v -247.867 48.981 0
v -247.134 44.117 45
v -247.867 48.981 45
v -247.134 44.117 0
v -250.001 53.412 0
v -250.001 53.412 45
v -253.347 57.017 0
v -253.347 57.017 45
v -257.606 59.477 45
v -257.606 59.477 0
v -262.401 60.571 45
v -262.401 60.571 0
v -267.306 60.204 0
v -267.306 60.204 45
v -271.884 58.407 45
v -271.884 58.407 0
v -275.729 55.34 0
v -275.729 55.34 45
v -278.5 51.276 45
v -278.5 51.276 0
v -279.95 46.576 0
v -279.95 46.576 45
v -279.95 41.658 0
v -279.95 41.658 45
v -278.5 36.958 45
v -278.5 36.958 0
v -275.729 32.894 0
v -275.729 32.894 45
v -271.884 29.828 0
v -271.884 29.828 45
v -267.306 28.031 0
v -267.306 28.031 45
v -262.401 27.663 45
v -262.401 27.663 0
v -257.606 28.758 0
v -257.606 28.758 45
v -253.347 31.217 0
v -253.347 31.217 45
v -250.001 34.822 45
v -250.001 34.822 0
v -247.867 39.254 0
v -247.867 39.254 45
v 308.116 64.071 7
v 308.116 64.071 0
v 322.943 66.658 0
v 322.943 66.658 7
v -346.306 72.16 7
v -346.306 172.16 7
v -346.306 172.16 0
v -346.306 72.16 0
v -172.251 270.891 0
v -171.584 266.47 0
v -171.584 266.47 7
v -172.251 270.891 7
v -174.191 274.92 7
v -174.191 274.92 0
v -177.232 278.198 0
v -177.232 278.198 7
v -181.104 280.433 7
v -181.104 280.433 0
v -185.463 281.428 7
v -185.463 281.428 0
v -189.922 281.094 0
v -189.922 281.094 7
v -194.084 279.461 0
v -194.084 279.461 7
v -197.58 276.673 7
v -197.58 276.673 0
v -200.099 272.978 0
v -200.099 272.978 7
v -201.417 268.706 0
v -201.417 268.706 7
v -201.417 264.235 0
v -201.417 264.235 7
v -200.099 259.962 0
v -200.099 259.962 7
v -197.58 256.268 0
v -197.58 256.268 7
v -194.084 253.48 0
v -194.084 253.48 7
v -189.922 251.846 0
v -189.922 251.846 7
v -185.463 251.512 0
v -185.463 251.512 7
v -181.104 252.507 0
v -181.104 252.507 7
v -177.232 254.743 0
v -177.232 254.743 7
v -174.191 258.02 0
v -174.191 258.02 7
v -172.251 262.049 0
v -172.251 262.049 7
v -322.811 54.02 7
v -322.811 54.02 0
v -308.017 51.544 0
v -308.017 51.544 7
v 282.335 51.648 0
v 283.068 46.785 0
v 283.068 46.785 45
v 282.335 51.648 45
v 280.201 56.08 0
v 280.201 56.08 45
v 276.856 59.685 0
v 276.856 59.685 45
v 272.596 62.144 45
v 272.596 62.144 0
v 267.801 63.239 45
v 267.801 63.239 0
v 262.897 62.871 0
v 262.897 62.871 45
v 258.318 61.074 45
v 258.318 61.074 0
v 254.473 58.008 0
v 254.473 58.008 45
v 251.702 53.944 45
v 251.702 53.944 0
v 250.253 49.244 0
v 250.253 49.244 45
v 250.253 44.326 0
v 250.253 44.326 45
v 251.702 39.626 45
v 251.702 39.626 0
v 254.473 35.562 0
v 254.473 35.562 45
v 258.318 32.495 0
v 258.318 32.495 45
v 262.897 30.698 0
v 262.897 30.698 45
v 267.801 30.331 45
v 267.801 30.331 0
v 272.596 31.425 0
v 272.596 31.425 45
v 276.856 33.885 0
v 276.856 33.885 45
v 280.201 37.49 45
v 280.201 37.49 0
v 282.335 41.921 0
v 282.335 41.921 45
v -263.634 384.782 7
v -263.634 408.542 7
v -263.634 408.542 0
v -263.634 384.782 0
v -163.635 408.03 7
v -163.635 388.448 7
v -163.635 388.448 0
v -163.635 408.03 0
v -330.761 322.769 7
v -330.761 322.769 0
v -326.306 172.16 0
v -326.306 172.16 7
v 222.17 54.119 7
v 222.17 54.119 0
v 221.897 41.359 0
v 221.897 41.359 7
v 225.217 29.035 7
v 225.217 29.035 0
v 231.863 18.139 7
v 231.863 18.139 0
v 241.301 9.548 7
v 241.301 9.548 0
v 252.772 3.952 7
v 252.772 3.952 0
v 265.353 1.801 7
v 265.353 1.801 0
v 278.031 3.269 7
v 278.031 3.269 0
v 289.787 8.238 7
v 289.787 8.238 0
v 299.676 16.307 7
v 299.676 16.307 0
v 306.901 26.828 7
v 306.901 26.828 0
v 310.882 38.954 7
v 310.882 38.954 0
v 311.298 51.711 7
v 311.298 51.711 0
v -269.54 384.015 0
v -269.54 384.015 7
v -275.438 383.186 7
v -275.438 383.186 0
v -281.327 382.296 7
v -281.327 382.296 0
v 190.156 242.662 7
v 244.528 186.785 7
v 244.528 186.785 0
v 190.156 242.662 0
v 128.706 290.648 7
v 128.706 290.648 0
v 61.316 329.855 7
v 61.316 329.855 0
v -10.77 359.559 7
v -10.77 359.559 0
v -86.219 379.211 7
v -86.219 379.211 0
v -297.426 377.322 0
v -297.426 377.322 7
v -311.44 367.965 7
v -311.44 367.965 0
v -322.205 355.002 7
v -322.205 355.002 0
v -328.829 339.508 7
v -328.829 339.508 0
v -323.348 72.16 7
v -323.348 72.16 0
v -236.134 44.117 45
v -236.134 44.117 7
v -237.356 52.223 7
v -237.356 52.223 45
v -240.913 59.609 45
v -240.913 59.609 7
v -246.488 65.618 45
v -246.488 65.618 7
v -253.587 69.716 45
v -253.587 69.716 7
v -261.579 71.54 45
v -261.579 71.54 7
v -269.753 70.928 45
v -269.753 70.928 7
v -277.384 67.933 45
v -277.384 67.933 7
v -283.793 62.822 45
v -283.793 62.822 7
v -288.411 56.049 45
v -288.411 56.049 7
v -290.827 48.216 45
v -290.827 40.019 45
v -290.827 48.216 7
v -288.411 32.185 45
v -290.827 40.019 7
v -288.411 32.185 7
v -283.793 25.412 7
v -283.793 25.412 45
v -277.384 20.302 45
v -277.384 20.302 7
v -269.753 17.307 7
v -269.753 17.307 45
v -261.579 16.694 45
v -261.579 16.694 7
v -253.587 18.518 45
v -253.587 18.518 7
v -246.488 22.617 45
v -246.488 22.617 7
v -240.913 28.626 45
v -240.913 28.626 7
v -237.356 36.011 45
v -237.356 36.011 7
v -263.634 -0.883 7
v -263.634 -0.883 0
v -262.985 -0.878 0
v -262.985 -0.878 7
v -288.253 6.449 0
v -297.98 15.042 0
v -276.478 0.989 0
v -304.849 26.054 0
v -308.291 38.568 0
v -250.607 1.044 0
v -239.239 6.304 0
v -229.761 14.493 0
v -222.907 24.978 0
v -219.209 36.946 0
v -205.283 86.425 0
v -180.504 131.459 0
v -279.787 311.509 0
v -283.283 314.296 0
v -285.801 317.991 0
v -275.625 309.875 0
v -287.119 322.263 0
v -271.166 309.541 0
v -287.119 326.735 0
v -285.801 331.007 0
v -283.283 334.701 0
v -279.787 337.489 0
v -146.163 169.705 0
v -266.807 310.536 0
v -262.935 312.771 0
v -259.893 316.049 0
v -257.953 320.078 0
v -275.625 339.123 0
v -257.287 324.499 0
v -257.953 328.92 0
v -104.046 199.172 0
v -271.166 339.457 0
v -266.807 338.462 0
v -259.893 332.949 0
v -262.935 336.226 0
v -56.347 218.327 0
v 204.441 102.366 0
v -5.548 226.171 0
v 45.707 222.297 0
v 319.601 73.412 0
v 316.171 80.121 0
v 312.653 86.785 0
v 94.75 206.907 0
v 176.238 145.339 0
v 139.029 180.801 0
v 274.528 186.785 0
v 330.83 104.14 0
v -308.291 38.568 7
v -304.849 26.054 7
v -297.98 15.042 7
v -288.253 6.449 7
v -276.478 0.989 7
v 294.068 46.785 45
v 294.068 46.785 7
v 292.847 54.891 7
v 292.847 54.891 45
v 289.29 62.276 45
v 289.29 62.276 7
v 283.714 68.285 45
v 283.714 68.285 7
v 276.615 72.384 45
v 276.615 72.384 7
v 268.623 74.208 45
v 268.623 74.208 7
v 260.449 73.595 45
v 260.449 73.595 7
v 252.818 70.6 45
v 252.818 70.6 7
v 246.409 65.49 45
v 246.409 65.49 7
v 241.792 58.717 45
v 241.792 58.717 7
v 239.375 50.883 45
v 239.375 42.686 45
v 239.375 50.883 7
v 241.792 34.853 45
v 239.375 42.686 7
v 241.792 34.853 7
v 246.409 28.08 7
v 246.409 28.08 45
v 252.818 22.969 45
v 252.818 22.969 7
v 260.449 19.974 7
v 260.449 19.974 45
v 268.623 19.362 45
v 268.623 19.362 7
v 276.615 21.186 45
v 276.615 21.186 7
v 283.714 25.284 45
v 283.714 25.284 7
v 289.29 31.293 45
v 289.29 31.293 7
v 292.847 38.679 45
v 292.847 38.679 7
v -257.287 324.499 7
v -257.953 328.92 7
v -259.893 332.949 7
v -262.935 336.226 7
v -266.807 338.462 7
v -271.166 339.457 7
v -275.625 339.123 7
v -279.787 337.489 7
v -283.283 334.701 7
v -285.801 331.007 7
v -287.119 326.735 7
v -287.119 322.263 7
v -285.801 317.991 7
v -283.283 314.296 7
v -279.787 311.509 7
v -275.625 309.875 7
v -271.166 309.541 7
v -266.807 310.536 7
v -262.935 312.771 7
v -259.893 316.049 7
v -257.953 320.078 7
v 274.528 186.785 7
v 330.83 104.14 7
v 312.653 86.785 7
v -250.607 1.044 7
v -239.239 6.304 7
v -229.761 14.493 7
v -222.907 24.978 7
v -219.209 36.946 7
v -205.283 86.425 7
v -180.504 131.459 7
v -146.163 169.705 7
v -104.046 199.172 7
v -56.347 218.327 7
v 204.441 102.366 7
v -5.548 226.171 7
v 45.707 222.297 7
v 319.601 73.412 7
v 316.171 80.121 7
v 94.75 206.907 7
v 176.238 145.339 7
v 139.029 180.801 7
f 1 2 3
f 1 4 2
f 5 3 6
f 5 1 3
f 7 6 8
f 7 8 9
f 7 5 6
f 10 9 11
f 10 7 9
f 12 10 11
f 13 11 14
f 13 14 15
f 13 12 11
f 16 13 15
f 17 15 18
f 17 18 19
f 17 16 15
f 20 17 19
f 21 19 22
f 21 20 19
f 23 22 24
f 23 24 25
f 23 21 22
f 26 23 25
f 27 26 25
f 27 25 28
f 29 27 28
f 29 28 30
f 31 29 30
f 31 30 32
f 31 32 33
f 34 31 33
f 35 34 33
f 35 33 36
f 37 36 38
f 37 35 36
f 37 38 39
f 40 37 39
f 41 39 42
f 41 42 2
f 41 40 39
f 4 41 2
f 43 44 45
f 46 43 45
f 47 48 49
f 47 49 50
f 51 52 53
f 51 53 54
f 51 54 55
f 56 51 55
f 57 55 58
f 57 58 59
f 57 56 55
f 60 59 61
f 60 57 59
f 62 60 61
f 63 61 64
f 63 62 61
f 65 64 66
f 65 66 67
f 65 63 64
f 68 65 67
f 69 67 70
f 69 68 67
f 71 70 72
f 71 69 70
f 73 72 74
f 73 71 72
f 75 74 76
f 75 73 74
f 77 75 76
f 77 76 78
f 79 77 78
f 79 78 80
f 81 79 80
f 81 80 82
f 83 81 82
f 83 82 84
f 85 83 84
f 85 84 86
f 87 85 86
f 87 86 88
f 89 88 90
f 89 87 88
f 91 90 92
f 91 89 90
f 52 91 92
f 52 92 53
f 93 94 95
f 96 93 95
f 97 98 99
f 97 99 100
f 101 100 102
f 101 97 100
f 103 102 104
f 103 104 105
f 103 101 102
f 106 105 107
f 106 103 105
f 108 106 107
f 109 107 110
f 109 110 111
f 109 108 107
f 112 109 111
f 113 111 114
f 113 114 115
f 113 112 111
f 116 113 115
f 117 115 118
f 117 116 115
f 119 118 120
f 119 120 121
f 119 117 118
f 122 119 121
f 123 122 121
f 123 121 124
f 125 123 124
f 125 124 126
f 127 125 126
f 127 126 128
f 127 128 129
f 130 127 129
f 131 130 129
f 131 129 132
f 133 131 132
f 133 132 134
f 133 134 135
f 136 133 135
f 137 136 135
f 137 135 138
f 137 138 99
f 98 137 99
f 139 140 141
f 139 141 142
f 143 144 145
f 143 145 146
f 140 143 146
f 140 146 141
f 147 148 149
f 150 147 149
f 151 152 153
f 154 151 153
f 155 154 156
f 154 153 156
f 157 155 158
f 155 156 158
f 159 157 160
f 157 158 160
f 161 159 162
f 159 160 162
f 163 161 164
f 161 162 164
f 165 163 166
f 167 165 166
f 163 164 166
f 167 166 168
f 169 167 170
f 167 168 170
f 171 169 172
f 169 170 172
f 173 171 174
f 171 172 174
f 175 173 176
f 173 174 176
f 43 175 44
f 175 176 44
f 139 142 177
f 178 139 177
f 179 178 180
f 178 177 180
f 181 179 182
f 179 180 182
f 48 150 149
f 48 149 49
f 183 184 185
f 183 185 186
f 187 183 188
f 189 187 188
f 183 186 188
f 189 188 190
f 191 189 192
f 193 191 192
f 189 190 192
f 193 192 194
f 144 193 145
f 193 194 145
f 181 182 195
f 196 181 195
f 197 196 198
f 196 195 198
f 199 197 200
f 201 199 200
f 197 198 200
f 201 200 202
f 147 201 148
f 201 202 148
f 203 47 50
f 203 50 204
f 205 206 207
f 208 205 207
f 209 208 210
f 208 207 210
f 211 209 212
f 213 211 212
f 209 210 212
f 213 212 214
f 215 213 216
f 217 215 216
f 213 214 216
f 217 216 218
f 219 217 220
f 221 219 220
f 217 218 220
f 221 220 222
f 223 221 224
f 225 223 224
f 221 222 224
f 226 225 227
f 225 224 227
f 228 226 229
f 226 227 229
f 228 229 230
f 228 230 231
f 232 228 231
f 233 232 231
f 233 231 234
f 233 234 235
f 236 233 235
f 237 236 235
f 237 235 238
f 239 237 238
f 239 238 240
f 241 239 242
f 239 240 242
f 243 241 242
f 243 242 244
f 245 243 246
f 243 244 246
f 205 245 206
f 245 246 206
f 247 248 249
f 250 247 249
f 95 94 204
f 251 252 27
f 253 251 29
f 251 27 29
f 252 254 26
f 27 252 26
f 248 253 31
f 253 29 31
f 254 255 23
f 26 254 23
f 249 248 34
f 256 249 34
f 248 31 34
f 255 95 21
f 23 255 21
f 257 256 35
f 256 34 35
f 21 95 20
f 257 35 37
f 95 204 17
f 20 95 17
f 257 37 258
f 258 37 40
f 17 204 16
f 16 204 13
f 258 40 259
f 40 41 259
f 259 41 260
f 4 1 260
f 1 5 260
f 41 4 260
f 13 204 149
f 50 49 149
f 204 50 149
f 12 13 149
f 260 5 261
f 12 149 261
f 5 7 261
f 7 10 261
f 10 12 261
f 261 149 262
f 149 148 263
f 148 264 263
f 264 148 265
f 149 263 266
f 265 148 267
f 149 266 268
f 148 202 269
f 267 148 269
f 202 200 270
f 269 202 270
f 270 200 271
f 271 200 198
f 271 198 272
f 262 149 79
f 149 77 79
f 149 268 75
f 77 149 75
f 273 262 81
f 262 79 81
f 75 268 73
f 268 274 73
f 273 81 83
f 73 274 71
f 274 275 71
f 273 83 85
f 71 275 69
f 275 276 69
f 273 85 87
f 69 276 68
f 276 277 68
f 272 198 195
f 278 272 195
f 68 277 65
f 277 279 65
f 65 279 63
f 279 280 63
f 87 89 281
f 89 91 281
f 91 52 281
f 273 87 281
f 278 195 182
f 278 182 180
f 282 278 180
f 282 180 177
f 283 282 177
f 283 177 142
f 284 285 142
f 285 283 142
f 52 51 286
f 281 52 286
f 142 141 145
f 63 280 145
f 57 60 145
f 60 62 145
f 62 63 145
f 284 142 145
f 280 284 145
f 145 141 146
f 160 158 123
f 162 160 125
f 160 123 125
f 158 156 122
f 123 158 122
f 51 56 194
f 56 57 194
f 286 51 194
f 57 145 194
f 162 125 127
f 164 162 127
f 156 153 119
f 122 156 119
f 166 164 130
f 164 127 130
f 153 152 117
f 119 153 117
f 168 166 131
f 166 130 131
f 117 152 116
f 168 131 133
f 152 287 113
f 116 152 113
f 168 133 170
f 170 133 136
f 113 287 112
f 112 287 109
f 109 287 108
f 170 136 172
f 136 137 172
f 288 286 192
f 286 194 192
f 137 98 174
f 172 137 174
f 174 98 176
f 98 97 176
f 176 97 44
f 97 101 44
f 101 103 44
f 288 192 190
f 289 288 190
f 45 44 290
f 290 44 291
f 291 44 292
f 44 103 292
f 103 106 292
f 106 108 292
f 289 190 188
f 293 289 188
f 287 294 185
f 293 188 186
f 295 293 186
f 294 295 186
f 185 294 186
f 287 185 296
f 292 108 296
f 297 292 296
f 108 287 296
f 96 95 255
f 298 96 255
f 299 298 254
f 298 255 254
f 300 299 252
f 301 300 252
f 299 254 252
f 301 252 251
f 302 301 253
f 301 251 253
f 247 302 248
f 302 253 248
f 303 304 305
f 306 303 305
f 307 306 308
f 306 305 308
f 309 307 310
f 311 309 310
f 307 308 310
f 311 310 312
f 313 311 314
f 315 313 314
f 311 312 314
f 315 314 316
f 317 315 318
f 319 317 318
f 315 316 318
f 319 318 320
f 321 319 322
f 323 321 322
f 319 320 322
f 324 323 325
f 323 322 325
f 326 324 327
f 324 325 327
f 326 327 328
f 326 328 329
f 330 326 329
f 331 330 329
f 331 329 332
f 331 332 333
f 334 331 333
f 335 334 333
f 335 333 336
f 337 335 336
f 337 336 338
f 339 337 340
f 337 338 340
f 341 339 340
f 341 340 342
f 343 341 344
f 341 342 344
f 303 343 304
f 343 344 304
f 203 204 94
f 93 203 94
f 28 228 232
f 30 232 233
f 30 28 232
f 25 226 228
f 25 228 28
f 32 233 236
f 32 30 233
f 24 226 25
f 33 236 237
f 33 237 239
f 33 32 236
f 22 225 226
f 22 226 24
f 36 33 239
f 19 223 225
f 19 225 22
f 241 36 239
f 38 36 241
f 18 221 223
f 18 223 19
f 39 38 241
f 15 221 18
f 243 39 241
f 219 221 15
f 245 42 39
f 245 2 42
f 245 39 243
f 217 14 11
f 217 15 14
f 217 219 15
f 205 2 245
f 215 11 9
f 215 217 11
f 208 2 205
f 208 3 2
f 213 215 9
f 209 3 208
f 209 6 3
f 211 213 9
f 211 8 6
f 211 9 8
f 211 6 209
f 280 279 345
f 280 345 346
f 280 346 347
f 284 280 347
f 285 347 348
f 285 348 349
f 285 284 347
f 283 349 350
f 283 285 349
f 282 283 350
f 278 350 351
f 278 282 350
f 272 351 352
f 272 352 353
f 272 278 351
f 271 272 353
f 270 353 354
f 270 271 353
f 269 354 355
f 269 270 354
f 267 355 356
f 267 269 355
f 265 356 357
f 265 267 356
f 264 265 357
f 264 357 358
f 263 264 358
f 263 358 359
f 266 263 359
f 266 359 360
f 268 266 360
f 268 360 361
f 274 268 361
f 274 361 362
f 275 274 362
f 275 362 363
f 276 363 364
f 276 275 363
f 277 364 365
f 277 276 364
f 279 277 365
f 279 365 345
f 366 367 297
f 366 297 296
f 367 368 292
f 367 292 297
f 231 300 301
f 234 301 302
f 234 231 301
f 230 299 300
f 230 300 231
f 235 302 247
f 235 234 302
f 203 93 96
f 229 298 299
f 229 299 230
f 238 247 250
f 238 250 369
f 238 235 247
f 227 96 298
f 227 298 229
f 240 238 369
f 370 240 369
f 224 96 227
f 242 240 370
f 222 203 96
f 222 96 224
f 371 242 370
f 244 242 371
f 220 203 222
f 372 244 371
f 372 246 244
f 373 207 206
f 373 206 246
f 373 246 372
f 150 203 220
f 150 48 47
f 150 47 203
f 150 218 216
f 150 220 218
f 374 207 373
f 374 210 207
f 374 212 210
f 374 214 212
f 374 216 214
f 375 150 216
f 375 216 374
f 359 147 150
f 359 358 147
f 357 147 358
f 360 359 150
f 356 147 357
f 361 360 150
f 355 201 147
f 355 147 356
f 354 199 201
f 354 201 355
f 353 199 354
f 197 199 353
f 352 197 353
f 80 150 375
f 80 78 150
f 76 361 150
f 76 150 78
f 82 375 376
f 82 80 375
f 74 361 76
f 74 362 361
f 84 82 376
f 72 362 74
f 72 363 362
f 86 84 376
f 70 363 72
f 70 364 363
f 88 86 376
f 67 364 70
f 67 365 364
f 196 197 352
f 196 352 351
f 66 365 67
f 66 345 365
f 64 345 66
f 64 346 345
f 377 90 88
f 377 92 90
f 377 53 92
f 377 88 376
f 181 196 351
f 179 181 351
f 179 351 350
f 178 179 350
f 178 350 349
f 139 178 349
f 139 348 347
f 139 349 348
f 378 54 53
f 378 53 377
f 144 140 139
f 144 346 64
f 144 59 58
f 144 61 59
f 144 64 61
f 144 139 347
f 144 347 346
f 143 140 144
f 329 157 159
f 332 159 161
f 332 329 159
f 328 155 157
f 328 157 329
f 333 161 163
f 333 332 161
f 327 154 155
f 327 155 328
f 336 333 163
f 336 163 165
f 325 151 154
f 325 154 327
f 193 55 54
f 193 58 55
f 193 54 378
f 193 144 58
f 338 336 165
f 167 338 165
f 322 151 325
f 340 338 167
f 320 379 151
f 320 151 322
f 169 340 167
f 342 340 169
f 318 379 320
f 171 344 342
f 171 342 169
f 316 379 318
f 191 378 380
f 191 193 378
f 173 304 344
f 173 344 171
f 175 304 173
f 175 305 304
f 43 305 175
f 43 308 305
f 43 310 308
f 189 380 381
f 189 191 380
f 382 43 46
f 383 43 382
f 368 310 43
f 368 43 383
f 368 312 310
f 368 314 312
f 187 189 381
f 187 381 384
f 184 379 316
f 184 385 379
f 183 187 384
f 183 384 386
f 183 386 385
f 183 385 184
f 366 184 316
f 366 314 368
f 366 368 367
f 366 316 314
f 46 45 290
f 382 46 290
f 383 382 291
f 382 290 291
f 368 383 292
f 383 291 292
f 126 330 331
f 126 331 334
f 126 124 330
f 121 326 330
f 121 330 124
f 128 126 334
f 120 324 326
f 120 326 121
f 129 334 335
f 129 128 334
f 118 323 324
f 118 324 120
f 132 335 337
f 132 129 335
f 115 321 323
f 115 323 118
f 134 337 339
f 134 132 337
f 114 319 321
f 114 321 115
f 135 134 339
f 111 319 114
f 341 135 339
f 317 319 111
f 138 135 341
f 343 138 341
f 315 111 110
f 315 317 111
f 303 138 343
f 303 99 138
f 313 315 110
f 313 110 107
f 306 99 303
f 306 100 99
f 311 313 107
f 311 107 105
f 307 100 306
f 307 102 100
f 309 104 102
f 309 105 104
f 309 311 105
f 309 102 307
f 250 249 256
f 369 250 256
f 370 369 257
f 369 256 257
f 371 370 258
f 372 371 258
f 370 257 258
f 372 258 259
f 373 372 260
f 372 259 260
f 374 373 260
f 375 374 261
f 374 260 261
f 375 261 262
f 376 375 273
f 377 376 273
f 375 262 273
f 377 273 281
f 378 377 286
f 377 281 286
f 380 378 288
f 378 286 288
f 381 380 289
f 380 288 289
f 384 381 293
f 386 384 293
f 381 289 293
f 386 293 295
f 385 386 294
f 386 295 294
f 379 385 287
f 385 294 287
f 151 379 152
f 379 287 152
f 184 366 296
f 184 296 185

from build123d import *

# Parameters (mm, degrees)
SKETCH1_R           = 16.5
SKETCH1_R_2         = 15
BOSS_EXTRUDE3_DEPTH = 7
SKETCH2_R           = 27.5
SKETCH2_R_2         = 16.5
BOSS_EXTRUDE4_DEPTH = 38
BOSS_EXTRUDE5_DEPTH = 7


with BuildPart() as part:
    # Sketch1 → Boss-Extrude3 (new body)
    with BuildSketch(Plane.XY):
        with BuildLine():
            Line((-322.811275448, 54.020092964), (-308.016991909, 51.544375984))
            ThreePointArc((-308.016991909, 51.544375984), (-297.979605272, 15.041649319), (-263.634141291, -0.882774953))
            Line((-263.634141291, -0.882774953), (-262.985194212, -0.878095462))
            ThreePointArc((-262.985194212, -0.878095462), (-234.213459723, 10.066916736), (-219.209238471, 36.945892575))
            ThreePointArc((-219.209238471, 36.945892575), (-5.54789332, 226.171081865), (222.17000985, 54.119057031))
            ThreePointArc((222.17000985, 54.119057031), (271.744200091, 2.083431527), (308.115870104, 64.070593748))
            Line((308.115870104, 64.070593748), (322.942948353, 66.658271071))
            ThreePointArc((322.942948353, 66.658271071), (72.802770658, 324.018256719), (-281.327086526, 382.296168148))
            ThreePointArc((-281.327086526, 382.296168148), (-317.291599122, 361.87304371), (-330.761322011, 322.769121357))
            Line((-330.761322011, 322.769121357), (-322.811275448, 54.020092964))
        make_face()
        with Locations((-263.634141291, 44.117225047)):
            Circle(SKETCH1_R, mode=Mode.SUBTRACT)
        with Locations((266.5683015, 46.784774614)):
            Circle(SKETCH1_R, mode=Mode.SUBTRACT)
        with Locations((-186.584414745, 266.470160007)):
            Circle(SKETCH1_R_2, mode=Mode.SUBTRACT)
        with Locations((-272.286901184, 324.498892702)):
            Circle(SKETCH1_R_2, mode=Mode.SUBTRACT)
    extrude(amount=BOSS_EXTRUDE3_DEPTH)

    # Sketch2 → Boss-Extrude4 (add)
    with BuildSketch(Plane.XY.offset(7)):
        with Locations((-263.634141291, 44.117225047)):
            Circle(SKETCH2_R)
        with Locations((-263.634141291, 44.117225047)):
            Circle(SKETCH2_R_2, mode=Mode.SUBTRACT)
        with Locations((266.5683015, 46.784774614)):
            Circle(SKETCH2_R)
        with Locations((266.5683015, 46.784774614)):
            Circle(SKETCH2_R_2, mode=Mode.SUBTRACT)
    extrude(amount=BOSS_EXTRUDE4_DEPTH)

    # Sketch3 → Boss-Extrude5 (add)
    with BuildSketch(Plane.XY.offset(7)):
        Polygon((-263.634141291, 408.541652183), (-263.634141291, 384.267252813), (-163.635450853, 388.029879984), (-163.635450853, 408.029879984), align=None)
        Polygon((-326.306060919, 172.160306647), (-346.306060919, 172.160306647), (-346.306060919, 72.160306647), (-323.347893363, 72.160306647), align=None)
        Polygon((244.528320181, 186.784774614), (312.652861422, 86.784774614), (330.829684073, 104.1400142), (274.528320181, 186.784774614), align=None)
    extrude(amount=-BOSS_EXTRUDE5_DEPTH)


solid = part.part
